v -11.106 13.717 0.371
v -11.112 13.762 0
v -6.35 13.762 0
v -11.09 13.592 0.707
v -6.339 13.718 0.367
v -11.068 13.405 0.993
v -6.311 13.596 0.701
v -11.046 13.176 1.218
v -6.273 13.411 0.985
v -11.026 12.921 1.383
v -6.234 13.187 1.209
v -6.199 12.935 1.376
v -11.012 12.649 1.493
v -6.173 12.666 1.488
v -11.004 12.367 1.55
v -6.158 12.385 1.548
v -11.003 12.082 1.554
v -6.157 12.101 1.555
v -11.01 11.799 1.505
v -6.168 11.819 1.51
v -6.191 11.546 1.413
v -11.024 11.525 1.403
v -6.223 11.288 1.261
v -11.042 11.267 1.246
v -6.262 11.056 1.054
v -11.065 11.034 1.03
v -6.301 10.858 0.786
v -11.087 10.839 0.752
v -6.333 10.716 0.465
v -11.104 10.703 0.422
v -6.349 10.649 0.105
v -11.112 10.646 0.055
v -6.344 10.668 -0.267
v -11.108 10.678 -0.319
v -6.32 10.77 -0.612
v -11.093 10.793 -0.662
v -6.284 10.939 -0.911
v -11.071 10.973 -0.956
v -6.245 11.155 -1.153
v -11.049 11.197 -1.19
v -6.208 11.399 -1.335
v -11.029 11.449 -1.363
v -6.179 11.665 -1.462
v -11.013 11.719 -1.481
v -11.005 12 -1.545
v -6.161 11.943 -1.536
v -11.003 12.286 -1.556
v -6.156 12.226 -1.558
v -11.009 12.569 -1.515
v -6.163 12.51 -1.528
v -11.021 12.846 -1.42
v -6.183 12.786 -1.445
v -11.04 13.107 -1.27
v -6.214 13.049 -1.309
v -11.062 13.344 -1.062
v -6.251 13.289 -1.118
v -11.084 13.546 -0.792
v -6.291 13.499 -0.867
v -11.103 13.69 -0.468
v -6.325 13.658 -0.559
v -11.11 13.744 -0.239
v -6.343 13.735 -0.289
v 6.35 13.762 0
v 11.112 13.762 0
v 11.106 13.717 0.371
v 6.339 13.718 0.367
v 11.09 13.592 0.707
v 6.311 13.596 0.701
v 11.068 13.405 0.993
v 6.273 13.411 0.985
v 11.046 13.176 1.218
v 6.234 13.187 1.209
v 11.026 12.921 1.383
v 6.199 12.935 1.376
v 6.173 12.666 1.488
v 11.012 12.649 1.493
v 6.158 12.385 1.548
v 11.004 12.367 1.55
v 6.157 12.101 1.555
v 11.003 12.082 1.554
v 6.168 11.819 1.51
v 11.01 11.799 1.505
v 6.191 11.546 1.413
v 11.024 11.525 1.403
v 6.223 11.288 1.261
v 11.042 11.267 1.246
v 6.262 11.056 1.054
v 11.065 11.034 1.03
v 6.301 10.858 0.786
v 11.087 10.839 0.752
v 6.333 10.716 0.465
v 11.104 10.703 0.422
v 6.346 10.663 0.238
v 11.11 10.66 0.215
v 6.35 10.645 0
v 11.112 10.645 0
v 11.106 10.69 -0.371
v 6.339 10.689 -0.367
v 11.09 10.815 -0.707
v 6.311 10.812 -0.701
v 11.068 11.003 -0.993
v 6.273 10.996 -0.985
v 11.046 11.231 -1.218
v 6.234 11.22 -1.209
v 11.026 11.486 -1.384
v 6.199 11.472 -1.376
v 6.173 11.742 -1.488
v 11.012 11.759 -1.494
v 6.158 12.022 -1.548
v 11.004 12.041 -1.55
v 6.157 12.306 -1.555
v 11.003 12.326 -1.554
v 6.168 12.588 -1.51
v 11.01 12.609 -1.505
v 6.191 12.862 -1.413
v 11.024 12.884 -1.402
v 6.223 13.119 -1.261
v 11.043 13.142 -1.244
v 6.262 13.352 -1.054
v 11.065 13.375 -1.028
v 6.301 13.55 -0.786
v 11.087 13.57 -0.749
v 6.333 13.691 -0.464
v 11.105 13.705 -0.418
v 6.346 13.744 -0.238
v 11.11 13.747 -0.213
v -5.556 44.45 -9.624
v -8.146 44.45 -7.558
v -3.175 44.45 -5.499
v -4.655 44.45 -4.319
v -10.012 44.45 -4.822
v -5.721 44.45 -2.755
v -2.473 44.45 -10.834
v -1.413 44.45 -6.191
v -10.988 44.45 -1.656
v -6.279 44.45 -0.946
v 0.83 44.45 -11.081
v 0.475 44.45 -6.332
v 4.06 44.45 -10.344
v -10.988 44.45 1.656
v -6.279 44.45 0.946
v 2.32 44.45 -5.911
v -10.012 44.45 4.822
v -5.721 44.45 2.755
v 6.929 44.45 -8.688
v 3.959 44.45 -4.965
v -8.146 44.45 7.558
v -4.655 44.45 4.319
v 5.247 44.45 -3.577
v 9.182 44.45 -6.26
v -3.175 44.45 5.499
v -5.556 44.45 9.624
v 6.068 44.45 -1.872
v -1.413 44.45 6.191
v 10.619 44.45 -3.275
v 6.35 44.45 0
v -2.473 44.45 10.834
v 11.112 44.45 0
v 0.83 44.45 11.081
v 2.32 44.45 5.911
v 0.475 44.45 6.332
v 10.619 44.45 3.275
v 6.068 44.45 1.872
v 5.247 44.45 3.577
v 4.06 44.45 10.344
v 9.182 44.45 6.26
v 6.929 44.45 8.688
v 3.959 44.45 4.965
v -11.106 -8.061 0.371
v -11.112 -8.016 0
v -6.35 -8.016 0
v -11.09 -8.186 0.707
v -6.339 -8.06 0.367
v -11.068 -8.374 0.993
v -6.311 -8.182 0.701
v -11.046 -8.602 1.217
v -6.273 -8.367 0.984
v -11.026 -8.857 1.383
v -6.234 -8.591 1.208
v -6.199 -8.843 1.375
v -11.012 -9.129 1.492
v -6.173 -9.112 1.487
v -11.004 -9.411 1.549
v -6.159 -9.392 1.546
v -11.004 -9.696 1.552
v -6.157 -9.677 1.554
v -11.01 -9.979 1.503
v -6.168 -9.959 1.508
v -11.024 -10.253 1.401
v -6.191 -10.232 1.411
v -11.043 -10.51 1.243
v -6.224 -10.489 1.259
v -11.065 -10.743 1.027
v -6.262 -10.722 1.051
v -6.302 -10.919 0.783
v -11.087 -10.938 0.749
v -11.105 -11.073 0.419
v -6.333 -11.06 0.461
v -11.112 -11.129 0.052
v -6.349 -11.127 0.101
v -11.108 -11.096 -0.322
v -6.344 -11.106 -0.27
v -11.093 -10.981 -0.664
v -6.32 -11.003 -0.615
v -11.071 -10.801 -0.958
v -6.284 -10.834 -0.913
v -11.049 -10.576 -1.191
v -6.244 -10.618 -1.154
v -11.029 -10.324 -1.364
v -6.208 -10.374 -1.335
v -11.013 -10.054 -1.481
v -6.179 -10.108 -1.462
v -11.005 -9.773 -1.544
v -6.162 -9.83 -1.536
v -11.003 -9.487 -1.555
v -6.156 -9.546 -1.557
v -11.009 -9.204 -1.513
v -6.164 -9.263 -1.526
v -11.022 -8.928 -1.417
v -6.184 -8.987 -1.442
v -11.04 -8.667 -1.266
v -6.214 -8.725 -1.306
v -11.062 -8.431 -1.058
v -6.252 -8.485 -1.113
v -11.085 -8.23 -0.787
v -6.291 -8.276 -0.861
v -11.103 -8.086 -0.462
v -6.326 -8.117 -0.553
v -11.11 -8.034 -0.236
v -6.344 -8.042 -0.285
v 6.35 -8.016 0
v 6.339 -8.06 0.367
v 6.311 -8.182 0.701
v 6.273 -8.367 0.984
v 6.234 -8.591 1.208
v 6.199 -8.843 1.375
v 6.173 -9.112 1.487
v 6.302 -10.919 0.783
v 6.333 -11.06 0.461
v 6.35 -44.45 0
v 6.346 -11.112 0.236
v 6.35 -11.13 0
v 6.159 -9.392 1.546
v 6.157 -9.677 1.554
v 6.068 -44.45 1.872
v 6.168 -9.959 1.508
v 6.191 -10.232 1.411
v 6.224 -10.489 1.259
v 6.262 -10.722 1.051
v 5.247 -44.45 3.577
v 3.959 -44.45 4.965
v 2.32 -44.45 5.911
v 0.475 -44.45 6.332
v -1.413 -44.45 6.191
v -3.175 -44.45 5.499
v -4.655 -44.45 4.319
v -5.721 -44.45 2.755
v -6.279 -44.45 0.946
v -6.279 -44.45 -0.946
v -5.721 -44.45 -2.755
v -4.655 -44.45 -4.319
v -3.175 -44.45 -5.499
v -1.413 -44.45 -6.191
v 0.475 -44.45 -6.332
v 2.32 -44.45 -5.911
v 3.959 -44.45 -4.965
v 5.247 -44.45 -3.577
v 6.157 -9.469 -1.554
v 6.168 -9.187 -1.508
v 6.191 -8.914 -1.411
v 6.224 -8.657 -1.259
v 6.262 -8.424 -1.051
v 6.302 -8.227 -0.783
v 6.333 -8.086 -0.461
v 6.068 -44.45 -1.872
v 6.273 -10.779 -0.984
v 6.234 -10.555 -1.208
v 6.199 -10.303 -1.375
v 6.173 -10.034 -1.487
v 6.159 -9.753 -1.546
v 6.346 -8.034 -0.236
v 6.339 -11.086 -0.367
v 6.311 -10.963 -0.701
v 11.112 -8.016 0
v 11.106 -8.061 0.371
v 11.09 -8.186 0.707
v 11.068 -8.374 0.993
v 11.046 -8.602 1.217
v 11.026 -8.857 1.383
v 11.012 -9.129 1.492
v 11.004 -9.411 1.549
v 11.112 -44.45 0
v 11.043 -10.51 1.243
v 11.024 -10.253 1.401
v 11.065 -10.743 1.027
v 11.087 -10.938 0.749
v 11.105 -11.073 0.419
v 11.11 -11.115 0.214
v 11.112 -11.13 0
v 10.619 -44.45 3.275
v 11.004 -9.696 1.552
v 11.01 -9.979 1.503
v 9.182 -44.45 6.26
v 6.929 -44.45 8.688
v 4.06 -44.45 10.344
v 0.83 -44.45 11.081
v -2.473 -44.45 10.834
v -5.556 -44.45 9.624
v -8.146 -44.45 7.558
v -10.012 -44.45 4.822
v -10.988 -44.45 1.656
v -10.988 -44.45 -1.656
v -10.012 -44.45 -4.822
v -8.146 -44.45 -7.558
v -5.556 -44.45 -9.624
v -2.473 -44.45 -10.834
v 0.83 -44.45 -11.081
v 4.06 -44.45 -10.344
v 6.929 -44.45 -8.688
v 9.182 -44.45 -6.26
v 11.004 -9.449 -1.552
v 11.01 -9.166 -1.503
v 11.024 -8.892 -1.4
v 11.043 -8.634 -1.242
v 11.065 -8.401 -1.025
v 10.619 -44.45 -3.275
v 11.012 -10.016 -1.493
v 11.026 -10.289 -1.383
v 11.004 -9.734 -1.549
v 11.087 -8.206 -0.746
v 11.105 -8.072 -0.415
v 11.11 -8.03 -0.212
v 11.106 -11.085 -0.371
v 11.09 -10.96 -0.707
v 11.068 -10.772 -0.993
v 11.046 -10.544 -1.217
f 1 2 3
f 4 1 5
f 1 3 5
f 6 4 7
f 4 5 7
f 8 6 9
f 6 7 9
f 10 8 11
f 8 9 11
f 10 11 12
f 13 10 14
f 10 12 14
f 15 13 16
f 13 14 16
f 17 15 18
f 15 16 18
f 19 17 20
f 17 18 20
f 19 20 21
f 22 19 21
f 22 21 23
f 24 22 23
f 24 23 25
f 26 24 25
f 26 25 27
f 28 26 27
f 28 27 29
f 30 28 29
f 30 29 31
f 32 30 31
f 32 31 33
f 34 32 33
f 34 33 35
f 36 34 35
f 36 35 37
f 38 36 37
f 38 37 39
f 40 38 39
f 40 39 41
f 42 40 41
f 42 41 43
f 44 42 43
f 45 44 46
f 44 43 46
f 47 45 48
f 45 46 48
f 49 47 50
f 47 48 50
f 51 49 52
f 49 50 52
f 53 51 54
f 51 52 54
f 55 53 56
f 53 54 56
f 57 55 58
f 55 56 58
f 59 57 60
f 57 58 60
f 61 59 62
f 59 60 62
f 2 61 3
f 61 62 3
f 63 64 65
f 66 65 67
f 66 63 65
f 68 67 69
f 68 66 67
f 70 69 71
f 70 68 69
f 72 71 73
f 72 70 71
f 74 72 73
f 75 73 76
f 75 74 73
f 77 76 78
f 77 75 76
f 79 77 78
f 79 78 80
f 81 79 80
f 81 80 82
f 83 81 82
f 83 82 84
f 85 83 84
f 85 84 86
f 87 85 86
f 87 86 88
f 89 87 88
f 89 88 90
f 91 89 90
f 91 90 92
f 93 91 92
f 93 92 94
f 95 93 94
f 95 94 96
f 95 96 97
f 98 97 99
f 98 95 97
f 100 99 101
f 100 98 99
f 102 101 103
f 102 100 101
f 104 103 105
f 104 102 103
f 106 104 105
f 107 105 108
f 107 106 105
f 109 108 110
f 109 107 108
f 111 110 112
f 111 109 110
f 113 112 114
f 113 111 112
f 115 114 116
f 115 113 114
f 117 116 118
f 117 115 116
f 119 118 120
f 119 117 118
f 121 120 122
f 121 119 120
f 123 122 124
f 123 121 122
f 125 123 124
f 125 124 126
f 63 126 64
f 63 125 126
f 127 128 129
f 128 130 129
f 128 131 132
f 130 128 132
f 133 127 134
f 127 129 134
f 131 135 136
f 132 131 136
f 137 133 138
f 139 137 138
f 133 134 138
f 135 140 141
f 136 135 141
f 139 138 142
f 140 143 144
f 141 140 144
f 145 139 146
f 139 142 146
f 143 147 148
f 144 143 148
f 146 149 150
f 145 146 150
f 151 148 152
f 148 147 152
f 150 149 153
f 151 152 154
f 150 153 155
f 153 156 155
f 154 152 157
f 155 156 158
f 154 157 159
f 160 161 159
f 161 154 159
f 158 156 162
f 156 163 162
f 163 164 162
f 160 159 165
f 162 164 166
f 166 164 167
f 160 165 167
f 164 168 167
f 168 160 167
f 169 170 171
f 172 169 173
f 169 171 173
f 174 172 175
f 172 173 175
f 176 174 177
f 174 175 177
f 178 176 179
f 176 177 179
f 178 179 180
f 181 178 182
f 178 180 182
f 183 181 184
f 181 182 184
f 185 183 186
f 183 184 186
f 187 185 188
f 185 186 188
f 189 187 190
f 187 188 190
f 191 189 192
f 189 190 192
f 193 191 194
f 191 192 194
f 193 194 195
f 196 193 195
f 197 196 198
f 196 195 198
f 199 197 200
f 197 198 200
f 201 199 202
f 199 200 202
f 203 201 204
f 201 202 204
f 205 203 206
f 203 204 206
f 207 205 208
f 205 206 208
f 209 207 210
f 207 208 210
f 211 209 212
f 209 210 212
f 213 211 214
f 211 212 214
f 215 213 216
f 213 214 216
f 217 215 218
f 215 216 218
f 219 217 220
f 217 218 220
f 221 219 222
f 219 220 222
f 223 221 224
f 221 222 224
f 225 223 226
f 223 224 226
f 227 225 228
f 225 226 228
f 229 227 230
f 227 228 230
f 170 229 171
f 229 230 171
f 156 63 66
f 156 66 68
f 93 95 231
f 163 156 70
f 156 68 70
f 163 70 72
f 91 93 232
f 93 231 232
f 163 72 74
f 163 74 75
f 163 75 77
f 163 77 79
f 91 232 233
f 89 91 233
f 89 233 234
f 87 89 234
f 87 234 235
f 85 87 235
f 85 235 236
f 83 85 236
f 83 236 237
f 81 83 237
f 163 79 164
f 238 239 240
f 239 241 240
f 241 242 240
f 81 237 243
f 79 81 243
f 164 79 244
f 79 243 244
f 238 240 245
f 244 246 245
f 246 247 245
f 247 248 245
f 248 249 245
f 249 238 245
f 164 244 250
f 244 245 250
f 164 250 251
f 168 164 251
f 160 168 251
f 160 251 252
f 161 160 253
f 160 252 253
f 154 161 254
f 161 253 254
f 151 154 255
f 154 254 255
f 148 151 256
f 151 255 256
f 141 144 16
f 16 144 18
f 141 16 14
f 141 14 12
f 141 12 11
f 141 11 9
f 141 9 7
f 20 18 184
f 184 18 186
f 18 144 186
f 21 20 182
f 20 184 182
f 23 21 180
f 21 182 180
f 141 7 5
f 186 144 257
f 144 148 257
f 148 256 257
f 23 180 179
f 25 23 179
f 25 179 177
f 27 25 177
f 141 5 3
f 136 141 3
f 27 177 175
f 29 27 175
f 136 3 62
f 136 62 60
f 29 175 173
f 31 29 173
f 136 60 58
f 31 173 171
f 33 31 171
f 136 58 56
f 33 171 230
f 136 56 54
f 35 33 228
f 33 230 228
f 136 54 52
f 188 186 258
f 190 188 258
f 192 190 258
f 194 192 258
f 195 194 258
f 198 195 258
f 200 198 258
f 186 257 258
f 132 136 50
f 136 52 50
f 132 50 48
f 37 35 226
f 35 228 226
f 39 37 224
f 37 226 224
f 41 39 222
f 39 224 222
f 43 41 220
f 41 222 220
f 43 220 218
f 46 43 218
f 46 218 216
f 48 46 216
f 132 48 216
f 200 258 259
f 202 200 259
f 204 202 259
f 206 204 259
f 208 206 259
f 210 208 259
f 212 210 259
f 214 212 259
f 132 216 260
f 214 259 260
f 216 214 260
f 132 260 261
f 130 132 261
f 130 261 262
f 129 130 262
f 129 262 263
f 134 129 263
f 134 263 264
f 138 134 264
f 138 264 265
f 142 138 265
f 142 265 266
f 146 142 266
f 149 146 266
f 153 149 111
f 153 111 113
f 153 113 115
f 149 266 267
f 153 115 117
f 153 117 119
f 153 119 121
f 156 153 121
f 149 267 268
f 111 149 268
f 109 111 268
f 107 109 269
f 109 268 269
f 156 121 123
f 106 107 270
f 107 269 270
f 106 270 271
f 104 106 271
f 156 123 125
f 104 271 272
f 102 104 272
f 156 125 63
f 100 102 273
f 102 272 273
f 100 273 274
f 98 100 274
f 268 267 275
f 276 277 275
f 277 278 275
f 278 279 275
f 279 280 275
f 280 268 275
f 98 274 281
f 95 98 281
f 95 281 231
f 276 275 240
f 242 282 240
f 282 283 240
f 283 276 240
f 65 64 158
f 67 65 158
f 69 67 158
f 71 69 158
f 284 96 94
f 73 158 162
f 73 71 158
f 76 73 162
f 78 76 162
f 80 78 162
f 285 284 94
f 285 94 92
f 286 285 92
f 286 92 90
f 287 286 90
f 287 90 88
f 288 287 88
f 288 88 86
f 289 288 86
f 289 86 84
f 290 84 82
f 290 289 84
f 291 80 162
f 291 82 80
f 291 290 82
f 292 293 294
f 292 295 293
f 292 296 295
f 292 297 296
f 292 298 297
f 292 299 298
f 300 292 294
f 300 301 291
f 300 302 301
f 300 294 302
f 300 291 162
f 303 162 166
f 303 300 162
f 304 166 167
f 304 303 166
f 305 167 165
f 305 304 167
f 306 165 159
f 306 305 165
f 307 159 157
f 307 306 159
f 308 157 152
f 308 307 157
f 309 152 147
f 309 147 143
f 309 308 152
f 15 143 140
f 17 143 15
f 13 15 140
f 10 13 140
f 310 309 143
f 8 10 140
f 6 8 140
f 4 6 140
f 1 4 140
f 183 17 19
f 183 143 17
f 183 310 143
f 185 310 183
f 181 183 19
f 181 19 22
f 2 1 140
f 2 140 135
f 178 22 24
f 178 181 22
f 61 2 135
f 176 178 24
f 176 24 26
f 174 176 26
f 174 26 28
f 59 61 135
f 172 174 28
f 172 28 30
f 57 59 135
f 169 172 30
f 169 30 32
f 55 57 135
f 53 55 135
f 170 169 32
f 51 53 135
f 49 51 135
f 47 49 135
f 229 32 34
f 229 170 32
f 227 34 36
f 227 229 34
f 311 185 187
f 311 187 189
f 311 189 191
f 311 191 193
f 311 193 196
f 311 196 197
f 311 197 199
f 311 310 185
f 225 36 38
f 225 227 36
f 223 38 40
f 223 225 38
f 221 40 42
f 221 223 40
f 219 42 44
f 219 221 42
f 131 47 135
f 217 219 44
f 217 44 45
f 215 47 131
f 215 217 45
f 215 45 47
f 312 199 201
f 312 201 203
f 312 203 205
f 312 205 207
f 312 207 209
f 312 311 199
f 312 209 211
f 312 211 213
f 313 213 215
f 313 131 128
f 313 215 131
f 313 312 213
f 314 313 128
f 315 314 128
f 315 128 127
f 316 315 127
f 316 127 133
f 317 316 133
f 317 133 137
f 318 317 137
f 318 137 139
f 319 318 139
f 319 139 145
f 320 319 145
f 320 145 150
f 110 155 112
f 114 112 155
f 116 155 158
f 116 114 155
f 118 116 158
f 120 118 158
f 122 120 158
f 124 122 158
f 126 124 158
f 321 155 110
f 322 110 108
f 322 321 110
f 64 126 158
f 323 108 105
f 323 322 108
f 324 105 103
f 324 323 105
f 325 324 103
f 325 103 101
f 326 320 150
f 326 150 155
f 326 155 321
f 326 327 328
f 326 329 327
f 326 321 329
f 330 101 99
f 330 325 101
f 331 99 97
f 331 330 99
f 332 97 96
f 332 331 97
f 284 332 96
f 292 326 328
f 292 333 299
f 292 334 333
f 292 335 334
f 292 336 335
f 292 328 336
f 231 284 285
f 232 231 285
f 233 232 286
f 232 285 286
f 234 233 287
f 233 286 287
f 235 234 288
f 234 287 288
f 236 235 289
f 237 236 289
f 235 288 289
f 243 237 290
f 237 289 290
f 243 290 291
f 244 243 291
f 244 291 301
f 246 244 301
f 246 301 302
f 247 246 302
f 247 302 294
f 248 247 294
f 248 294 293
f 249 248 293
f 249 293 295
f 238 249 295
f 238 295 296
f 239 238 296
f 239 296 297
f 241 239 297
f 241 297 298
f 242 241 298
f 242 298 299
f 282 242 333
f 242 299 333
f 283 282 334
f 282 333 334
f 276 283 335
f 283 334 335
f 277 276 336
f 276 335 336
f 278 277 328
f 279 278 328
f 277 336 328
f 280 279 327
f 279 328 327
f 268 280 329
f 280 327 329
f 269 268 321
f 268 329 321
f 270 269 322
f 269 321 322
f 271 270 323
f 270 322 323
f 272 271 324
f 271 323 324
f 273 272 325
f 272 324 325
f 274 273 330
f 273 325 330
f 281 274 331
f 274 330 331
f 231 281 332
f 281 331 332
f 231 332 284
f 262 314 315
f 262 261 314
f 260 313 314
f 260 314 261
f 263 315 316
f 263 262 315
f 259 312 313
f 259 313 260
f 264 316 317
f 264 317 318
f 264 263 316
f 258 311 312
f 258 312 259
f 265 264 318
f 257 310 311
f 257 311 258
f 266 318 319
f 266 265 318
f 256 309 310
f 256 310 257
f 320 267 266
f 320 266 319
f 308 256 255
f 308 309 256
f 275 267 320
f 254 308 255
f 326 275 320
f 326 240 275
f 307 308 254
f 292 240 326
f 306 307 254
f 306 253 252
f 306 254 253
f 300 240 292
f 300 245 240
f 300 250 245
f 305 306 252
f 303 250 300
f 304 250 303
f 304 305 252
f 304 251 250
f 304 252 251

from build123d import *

# Parameters (mm, degrees)
F0_R     = 11.1125
F1_DEPTH = 44.45
F2_R     = 6.35
F3_DEPTH = 88.9
F4_R     = 1.5584639764
F4_R_2   = 1.5569858866
F5_DEPTH = 12.7
F6_DEPTH = 12.7


with BuildPart() as f1:
    # F0 (on Front) → F1 (new body, symmetric)
    with BuildSketch(Plane.XZ):
        Circle(F0_R)
    extrude(amount=F1_DEPTH, both=True)

    # F2 (on face) → F3 (cut)
    with BuildSketch(Plane.XZ.offset(44.45)):
        Circle(F2_R)
    extrude(amount=-F3_DEPTH, mode=Mode.SUBTRACT)

    # F4 (on Right) → F5 (cut, symmetric)
    with BuildSketch(Plane.YZ):
        with Locations((12.2036093806, 0)):
            Circle(F4_R)
        with Locations((-9.5729407563, 0)):
            Circle(F4_R_2)
    extrude(amount=F5_DEPTH, both=True, mode=Mode.SUBTRACT)

    # F4 (on Right) → F6 (cut, symmetric)
    with BuildSketch(Plane.YZ):
        with Locations((12.2036093806, 0)):
            Circle(F4_R)
        with Locations((-9.5729407563, 0)):
            Circle(F4_R_2)
    extrude(amount=F6_DEPTH, both=True, mode=Mode.SUBTRACT)


solid = f1.part
